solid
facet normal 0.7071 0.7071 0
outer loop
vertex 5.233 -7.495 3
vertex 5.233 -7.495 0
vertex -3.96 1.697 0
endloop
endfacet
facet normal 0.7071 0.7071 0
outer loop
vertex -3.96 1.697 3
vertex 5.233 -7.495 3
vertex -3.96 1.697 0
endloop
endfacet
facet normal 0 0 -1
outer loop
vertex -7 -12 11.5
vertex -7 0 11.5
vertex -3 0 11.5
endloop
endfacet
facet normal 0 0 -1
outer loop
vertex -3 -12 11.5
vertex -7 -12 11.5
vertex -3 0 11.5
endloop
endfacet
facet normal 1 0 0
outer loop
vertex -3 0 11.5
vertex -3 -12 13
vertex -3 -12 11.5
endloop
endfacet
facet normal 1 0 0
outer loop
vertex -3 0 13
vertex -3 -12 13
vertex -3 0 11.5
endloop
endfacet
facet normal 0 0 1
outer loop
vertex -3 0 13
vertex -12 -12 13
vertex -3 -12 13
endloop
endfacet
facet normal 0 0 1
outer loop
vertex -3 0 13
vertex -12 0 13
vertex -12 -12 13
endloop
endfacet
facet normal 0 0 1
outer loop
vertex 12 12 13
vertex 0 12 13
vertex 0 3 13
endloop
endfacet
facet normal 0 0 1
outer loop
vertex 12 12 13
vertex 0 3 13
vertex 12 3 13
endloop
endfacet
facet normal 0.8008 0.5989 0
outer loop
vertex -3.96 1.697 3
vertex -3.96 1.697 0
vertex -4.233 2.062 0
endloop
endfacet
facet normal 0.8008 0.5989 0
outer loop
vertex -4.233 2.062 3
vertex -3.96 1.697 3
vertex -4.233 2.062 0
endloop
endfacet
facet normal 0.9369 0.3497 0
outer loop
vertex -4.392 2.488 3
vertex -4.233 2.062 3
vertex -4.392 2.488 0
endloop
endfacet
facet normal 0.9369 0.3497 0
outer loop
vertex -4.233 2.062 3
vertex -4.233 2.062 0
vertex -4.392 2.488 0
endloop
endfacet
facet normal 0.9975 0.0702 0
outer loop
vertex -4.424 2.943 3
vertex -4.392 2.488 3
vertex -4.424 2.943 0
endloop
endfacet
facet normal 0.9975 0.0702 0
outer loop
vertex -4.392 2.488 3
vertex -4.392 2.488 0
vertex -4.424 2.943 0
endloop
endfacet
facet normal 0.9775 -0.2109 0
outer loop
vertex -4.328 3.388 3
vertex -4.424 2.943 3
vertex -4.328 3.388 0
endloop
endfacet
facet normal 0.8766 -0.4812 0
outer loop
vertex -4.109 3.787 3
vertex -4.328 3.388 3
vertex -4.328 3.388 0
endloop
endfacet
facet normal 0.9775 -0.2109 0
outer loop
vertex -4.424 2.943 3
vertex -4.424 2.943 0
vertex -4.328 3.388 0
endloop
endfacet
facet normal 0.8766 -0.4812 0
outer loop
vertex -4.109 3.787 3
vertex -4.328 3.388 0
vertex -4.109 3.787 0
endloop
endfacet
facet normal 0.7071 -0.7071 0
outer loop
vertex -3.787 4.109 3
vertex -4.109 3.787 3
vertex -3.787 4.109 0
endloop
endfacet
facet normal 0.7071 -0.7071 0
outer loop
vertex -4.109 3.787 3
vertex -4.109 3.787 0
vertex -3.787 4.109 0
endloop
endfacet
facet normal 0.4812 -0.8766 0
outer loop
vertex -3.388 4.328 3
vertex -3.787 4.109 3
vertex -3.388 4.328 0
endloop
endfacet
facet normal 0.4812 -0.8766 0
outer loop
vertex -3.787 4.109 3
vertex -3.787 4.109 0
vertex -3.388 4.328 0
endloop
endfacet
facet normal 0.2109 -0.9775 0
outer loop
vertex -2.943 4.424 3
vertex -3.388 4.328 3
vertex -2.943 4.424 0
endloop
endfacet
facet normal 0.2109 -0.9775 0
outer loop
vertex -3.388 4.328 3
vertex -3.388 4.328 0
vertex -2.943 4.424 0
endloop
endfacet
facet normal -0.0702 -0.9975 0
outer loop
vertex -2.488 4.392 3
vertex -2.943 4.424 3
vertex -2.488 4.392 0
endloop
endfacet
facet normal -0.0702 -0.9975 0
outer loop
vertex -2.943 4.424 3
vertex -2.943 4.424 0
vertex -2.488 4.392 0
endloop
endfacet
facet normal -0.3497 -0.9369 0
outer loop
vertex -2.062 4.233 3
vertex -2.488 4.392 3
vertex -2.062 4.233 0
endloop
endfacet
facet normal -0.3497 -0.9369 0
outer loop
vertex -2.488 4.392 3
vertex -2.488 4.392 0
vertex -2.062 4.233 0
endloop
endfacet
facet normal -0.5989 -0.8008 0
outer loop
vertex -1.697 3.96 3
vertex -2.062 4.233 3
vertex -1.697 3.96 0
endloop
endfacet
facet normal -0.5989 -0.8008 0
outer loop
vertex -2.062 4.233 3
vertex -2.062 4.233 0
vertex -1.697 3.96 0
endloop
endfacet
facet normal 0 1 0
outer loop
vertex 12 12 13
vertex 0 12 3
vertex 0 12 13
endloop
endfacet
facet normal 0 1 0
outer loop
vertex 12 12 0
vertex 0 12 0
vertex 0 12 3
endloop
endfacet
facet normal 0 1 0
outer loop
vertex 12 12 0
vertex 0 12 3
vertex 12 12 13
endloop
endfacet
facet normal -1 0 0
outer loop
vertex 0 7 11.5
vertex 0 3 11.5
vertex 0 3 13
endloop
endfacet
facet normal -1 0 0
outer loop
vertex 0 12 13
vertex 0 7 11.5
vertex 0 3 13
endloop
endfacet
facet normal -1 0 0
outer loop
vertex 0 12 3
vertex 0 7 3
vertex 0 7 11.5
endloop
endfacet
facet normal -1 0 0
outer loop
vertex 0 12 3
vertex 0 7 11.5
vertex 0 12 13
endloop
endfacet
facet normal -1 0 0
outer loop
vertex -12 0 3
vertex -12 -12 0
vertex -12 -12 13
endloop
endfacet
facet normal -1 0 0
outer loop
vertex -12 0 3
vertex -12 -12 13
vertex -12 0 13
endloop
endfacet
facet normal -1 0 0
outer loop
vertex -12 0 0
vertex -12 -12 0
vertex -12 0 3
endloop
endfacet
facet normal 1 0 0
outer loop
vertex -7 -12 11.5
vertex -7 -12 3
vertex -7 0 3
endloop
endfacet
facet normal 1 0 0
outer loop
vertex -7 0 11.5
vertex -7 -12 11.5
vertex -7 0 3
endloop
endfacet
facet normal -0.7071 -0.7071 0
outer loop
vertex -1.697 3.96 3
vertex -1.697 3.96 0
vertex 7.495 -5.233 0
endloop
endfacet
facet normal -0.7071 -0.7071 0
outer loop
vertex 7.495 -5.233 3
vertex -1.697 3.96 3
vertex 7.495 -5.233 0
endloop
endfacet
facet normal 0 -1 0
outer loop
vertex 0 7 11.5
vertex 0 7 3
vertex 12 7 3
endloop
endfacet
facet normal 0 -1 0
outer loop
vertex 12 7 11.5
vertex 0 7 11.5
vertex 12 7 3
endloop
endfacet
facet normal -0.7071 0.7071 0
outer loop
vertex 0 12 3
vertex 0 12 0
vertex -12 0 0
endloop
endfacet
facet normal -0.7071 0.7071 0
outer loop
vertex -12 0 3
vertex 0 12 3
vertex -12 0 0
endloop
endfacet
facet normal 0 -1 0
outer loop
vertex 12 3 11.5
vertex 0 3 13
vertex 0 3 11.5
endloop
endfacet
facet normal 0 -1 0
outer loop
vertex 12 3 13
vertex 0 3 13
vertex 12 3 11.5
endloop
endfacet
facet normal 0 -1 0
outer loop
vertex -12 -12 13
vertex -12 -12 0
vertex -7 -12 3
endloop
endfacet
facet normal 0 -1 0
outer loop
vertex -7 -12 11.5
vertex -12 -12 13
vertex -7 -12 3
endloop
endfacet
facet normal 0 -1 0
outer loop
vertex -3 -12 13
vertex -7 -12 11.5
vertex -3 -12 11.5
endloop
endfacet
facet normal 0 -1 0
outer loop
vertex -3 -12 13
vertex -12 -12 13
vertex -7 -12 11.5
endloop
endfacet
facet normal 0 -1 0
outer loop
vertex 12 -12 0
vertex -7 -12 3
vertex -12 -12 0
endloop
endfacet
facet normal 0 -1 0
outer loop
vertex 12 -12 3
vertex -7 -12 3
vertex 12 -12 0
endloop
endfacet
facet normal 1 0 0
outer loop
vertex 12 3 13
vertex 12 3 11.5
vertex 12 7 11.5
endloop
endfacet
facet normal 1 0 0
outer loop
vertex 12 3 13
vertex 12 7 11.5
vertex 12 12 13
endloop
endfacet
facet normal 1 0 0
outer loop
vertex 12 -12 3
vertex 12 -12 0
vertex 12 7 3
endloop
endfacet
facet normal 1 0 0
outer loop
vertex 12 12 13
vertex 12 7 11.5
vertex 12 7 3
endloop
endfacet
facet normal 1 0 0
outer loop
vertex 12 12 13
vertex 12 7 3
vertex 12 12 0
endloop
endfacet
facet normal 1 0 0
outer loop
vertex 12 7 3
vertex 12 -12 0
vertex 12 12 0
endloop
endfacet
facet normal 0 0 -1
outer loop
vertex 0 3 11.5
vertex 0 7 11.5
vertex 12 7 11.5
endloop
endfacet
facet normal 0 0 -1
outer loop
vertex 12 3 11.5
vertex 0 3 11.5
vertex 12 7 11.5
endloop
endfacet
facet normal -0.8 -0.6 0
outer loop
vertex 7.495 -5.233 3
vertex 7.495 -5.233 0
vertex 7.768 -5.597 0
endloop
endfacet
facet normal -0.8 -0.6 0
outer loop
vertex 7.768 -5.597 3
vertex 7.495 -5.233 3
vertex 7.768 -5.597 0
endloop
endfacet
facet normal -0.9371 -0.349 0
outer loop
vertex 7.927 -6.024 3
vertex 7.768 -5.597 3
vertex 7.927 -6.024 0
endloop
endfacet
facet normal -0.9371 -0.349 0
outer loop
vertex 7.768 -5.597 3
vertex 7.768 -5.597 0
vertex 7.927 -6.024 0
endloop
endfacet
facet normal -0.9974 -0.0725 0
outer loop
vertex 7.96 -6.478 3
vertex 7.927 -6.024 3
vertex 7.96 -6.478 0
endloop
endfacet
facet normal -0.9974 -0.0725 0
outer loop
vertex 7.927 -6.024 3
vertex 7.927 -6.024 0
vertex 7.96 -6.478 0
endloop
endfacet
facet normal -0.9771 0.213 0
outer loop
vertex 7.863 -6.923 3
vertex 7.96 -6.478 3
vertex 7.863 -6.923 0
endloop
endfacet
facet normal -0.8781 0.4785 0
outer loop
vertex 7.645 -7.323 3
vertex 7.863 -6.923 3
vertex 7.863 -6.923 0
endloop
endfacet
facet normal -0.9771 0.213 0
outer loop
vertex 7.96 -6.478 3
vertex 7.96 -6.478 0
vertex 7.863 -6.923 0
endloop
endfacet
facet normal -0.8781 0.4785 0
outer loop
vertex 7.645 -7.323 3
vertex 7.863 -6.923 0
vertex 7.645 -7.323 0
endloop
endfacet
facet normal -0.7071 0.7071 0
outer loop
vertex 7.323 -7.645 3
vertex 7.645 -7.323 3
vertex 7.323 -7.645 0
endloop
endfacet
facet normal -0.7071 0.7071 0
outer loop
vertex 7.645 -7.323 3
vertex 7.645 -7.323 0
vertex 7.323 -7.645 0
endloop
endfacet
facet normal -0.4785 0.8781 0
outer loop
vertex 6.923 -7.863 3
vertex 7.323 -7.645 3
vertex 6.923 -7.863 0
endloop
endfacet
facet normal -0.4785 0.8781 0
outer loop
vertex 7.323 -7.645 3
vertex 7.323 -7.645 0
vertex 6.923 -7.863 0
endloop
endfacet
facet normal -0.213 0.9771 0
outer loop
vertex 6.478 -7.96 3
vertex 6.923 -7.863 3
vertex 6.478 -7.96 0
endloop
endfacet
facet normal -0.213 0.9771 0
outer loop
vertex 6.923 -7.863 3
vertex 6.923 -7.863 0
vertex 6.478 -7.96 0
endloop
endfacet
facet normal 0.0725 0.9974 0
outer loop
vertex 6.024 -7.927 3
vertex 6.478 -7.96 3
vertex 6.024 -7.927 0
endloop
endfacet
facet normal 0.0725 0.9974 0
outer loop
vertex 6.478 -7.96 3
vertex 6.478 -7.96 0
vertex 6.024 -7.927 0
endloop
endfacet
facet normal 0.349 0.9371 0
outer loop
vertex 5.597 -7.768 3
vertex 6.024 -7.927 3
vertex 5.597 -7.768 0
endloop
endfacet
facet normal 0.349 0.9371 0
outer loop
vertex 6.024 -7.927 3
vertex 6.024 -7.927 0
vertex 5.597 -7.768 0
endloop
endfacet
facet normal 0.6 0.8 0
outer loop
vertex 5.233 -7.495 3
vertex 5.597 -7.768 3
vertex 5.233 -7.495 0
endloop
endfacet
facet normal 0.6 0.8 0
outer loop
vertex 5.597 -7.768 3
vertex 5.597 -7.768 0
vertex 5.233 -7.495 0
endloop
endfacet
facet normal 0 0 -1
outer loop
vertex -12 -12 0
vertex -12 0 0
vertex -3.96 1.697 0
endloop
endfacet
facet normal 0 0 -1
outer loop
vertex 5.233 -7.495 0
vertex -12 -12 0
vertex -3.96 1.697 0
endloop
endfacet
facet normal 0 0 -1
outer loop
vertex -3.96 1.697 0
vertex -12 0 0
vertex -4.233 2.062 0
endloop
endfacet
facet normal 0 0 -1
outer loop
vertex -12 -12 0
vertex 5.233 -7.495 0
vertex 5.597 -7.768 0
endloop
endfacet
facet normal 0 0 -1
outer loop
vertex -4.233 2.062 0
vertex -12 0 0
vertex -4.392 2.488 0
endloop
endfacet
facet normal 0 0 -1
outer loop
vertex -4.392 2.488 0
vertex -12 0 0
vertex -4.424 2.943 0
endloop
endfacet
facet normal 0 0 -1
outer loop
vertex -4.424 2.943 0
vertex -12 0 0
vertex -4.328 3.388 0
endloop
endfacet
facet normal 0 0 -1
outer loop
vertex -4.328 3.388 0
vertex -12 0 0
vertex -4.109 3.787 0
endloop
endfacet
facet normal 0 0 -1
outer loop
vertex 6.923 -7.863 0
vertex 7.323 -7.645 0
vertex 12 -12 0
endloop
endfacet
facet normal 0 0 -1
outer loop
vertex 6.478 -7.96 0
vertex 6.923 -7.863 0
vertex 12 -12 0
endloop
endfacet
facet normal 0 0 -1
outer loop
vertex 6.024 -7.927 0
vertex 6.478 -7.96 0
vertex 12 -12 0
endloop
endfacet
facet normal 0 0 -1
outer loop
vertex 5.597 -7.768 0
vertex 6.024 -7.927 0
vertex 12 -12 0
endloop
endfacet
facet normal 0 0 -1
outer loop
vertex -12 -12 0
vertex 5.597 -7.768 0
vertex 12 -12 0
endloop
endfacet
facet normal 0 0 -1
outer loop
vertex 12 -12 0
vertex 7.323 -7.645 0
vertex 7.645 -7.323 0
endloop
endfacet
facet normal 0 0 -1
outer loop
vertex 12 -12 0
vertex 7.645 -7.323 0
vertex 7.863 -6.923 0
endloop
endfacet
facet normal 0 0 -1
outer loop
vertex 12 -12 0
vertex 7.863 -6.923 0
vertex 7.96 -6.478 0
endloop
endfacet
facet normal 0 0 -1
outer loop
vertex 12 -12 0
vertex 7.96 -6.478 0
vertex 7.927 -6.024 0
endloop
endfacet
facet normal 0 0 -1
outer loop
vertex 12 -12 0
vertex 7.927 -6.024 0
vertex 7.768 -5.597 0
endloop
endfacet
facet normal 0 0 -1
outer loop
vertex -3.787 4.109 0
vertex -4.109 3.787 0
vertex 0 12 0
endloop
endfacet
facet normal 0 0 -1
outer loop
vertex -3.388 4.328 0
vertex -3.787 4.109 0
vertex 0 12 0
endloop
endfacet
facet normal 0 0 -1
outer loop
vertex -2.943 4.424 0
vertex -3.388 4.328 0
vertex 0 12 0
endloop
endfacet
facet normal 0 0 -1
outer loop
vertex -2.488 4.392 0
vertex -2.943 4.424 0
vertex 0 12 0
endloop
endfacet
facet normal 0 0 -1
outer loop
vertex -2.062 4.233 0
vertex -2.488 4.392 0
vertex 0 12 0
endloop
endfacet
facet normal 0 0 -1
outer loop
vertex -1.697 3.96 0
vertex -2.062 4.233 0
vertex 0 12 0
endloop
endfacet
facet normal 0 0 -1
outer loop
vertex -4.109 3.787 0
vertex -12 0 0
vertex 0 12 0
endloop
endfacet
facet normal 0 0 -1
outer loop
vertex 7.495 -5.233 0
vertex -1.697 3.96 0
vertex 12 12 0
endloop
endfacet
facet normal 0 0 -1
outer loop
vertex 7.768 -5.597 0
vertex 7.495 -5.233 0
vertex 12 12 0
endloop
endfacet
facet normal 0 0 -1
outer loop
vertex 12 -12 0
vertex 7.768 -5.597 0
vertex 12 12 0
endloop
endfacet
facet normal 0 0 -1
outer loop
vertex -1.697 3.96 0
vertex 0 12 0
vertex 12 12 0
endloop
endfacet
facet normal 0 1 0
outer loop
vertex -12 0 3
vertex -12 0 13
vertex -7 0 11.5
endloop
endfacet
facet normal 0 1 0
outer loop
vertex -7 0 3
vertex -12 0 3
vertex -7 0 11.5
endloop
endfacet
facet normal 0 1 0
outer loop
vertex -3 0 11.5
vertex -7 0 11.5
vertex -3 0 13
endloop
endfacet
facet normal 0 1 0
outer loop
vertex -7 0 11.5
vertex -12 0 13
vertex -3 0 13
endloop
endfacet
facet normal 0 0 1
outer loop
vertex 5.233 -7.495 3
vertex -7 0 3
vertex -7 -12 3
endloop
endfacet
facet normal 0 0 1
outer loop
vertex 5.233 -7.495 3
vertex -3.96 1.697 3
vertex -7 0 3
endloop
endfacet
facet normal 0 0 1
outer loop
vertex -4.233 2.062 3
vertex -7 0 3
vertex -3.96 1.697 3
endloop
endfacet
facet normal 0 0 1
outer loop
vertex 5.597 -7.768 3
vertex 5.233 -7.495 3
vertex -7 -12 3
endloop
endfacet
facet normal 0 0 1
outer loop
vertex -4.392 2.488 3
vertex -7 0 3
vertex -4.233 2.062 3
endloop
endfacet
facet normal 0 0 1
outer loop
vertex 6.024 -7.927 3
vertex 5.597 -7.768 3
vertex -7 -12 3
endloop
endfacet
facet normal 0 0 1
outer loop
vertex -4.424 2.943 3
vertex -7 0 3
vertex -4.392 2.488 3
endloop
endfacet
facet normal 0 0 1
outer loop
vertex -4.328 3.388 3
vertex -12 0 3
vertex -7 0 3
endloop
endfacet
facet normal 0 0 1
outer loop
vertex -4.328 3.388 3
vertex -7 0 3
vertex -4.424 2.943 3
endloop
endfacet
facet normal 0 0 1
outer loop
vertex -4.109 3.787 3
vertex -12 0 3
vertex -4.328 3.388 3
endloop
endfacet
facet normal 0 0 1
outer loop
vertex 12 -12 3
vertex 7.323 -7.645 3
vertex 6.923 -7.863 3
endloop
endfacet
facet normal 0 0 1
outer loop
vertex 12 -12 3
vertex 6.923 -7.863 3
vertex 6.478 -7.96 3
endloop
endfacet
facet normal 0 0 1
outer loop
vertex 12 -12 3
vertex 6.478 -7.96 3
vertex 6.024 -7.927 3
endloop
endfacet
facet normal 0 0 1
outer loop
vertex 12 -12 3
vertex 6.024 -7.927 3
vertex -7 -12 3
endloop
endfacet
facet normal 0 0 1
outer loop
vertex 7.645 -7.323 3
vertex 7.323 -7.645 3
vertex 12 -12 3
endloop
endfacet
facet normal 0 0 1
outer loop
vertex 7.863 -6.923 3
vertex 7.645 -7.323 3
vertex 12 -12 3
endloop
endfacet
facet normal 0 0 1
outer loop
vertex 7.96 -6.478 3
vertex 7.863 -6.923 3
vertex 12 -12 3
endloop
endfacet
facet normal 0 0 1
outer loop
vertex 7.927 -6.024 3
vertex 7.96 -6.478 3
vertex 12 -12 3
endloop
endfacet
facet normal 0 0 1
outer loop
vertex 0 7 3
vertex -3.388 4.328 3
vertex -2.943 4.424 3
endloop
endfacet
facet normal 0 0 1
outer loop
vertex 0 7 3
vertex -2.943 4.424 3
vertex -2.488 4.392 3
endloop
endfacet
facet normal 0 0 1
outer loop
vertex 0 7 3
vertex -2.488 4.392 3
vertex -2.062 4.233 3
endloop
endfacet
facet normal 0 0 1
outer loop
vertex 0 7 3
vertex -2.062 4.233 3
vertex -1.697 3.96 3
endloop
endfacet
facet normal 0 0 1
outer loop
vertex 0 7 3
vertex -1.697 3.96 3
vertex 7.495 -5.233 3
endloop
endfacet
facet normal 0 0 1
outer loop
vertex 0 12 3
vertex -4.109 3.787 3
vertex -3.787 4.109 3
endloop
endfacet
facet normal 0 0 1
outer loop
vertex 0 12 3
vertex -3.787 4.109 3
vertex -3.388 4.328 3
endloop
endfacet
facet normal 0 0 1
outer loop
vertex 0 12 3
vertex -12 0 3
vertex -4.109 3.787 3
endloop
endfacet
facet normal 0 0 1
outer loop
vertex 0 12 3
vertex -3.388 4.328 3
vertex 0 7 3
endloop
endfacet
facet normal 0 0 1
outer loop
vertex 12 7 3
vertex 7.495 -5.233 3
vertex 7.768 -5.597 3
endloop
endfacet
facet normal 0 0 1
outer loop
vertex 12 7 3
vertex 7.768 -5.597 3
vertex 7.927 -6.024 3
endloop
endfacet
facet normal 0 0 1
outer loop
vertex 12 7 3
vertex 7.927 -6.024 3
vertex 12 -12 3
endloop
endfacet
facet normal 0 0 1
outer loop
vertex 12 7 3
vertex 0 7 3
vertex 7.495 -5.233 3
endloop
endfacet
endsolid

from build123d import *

# Parameters (mm, degrees)
F1_DEPTH = 3
F0_W     = 5
F0_H     = 12
F0_W_2   = 12
F0_H_2   = 5
F2_DEPTH = 13
F4_W     = 3.9998013438
F4_H     = 12
F4_W_2   = 12
F4_H_2   = 4
F5_DEPTH = 1.5


with BuildPart() as f1:
    # F0 (on Top) → F1 (new body)
    with BuildSketch(Plane.XY):
        Polygon((0, 7), (0, 12), (-12, 0), (-7, 0), (-7, -12), (12, -12), (12, 7), align=None)
        with BuildLine():
            ThreePointArc((-3.9597979746, 1.6970562748), (-3.9597979746, 3.9597979746), (-1.6970562748, 3.9597979746))
            Line((-1.6970562748, 3.9597979746), (7.4953318806, -5.2325901808))
            ThreePointArc((7.4953318806, -5.2325901808), (7.4953318806, -7.4953318806), (5.2325901808, -7.4953318806))
            Line((5.2325901808, -7.4953318806), (-3.9597979746, 1.6970562748))
        make_face(mode=Mode.SUBTRACT)
    extrude(amount=F1_DEPTH)

    # F0 (on Top) → F2 (join)
    with BuildSketch(Plane.XY):
        with Locations((-9.5, -6)):
            Rectangle(F0_W, F0_H)
        with Locations((6, 9.5)):
            Rectangle(F0_W_2, F0_H_2)
    extrude(amount=F2_DEPTH)

    # F4 (on offset) → F5 (join)
    with BuildSketch(Plane.XY.offset(13)):
        with Locations((-5.0000993281, -6)):
            Rectangle(F4_W, F4_H)
        with Locations((6, 5)):
            Rectangle(F4_W_2, F4_H_2)
    extrude(amount=-F5_DEPTH)


solid = f1.part
